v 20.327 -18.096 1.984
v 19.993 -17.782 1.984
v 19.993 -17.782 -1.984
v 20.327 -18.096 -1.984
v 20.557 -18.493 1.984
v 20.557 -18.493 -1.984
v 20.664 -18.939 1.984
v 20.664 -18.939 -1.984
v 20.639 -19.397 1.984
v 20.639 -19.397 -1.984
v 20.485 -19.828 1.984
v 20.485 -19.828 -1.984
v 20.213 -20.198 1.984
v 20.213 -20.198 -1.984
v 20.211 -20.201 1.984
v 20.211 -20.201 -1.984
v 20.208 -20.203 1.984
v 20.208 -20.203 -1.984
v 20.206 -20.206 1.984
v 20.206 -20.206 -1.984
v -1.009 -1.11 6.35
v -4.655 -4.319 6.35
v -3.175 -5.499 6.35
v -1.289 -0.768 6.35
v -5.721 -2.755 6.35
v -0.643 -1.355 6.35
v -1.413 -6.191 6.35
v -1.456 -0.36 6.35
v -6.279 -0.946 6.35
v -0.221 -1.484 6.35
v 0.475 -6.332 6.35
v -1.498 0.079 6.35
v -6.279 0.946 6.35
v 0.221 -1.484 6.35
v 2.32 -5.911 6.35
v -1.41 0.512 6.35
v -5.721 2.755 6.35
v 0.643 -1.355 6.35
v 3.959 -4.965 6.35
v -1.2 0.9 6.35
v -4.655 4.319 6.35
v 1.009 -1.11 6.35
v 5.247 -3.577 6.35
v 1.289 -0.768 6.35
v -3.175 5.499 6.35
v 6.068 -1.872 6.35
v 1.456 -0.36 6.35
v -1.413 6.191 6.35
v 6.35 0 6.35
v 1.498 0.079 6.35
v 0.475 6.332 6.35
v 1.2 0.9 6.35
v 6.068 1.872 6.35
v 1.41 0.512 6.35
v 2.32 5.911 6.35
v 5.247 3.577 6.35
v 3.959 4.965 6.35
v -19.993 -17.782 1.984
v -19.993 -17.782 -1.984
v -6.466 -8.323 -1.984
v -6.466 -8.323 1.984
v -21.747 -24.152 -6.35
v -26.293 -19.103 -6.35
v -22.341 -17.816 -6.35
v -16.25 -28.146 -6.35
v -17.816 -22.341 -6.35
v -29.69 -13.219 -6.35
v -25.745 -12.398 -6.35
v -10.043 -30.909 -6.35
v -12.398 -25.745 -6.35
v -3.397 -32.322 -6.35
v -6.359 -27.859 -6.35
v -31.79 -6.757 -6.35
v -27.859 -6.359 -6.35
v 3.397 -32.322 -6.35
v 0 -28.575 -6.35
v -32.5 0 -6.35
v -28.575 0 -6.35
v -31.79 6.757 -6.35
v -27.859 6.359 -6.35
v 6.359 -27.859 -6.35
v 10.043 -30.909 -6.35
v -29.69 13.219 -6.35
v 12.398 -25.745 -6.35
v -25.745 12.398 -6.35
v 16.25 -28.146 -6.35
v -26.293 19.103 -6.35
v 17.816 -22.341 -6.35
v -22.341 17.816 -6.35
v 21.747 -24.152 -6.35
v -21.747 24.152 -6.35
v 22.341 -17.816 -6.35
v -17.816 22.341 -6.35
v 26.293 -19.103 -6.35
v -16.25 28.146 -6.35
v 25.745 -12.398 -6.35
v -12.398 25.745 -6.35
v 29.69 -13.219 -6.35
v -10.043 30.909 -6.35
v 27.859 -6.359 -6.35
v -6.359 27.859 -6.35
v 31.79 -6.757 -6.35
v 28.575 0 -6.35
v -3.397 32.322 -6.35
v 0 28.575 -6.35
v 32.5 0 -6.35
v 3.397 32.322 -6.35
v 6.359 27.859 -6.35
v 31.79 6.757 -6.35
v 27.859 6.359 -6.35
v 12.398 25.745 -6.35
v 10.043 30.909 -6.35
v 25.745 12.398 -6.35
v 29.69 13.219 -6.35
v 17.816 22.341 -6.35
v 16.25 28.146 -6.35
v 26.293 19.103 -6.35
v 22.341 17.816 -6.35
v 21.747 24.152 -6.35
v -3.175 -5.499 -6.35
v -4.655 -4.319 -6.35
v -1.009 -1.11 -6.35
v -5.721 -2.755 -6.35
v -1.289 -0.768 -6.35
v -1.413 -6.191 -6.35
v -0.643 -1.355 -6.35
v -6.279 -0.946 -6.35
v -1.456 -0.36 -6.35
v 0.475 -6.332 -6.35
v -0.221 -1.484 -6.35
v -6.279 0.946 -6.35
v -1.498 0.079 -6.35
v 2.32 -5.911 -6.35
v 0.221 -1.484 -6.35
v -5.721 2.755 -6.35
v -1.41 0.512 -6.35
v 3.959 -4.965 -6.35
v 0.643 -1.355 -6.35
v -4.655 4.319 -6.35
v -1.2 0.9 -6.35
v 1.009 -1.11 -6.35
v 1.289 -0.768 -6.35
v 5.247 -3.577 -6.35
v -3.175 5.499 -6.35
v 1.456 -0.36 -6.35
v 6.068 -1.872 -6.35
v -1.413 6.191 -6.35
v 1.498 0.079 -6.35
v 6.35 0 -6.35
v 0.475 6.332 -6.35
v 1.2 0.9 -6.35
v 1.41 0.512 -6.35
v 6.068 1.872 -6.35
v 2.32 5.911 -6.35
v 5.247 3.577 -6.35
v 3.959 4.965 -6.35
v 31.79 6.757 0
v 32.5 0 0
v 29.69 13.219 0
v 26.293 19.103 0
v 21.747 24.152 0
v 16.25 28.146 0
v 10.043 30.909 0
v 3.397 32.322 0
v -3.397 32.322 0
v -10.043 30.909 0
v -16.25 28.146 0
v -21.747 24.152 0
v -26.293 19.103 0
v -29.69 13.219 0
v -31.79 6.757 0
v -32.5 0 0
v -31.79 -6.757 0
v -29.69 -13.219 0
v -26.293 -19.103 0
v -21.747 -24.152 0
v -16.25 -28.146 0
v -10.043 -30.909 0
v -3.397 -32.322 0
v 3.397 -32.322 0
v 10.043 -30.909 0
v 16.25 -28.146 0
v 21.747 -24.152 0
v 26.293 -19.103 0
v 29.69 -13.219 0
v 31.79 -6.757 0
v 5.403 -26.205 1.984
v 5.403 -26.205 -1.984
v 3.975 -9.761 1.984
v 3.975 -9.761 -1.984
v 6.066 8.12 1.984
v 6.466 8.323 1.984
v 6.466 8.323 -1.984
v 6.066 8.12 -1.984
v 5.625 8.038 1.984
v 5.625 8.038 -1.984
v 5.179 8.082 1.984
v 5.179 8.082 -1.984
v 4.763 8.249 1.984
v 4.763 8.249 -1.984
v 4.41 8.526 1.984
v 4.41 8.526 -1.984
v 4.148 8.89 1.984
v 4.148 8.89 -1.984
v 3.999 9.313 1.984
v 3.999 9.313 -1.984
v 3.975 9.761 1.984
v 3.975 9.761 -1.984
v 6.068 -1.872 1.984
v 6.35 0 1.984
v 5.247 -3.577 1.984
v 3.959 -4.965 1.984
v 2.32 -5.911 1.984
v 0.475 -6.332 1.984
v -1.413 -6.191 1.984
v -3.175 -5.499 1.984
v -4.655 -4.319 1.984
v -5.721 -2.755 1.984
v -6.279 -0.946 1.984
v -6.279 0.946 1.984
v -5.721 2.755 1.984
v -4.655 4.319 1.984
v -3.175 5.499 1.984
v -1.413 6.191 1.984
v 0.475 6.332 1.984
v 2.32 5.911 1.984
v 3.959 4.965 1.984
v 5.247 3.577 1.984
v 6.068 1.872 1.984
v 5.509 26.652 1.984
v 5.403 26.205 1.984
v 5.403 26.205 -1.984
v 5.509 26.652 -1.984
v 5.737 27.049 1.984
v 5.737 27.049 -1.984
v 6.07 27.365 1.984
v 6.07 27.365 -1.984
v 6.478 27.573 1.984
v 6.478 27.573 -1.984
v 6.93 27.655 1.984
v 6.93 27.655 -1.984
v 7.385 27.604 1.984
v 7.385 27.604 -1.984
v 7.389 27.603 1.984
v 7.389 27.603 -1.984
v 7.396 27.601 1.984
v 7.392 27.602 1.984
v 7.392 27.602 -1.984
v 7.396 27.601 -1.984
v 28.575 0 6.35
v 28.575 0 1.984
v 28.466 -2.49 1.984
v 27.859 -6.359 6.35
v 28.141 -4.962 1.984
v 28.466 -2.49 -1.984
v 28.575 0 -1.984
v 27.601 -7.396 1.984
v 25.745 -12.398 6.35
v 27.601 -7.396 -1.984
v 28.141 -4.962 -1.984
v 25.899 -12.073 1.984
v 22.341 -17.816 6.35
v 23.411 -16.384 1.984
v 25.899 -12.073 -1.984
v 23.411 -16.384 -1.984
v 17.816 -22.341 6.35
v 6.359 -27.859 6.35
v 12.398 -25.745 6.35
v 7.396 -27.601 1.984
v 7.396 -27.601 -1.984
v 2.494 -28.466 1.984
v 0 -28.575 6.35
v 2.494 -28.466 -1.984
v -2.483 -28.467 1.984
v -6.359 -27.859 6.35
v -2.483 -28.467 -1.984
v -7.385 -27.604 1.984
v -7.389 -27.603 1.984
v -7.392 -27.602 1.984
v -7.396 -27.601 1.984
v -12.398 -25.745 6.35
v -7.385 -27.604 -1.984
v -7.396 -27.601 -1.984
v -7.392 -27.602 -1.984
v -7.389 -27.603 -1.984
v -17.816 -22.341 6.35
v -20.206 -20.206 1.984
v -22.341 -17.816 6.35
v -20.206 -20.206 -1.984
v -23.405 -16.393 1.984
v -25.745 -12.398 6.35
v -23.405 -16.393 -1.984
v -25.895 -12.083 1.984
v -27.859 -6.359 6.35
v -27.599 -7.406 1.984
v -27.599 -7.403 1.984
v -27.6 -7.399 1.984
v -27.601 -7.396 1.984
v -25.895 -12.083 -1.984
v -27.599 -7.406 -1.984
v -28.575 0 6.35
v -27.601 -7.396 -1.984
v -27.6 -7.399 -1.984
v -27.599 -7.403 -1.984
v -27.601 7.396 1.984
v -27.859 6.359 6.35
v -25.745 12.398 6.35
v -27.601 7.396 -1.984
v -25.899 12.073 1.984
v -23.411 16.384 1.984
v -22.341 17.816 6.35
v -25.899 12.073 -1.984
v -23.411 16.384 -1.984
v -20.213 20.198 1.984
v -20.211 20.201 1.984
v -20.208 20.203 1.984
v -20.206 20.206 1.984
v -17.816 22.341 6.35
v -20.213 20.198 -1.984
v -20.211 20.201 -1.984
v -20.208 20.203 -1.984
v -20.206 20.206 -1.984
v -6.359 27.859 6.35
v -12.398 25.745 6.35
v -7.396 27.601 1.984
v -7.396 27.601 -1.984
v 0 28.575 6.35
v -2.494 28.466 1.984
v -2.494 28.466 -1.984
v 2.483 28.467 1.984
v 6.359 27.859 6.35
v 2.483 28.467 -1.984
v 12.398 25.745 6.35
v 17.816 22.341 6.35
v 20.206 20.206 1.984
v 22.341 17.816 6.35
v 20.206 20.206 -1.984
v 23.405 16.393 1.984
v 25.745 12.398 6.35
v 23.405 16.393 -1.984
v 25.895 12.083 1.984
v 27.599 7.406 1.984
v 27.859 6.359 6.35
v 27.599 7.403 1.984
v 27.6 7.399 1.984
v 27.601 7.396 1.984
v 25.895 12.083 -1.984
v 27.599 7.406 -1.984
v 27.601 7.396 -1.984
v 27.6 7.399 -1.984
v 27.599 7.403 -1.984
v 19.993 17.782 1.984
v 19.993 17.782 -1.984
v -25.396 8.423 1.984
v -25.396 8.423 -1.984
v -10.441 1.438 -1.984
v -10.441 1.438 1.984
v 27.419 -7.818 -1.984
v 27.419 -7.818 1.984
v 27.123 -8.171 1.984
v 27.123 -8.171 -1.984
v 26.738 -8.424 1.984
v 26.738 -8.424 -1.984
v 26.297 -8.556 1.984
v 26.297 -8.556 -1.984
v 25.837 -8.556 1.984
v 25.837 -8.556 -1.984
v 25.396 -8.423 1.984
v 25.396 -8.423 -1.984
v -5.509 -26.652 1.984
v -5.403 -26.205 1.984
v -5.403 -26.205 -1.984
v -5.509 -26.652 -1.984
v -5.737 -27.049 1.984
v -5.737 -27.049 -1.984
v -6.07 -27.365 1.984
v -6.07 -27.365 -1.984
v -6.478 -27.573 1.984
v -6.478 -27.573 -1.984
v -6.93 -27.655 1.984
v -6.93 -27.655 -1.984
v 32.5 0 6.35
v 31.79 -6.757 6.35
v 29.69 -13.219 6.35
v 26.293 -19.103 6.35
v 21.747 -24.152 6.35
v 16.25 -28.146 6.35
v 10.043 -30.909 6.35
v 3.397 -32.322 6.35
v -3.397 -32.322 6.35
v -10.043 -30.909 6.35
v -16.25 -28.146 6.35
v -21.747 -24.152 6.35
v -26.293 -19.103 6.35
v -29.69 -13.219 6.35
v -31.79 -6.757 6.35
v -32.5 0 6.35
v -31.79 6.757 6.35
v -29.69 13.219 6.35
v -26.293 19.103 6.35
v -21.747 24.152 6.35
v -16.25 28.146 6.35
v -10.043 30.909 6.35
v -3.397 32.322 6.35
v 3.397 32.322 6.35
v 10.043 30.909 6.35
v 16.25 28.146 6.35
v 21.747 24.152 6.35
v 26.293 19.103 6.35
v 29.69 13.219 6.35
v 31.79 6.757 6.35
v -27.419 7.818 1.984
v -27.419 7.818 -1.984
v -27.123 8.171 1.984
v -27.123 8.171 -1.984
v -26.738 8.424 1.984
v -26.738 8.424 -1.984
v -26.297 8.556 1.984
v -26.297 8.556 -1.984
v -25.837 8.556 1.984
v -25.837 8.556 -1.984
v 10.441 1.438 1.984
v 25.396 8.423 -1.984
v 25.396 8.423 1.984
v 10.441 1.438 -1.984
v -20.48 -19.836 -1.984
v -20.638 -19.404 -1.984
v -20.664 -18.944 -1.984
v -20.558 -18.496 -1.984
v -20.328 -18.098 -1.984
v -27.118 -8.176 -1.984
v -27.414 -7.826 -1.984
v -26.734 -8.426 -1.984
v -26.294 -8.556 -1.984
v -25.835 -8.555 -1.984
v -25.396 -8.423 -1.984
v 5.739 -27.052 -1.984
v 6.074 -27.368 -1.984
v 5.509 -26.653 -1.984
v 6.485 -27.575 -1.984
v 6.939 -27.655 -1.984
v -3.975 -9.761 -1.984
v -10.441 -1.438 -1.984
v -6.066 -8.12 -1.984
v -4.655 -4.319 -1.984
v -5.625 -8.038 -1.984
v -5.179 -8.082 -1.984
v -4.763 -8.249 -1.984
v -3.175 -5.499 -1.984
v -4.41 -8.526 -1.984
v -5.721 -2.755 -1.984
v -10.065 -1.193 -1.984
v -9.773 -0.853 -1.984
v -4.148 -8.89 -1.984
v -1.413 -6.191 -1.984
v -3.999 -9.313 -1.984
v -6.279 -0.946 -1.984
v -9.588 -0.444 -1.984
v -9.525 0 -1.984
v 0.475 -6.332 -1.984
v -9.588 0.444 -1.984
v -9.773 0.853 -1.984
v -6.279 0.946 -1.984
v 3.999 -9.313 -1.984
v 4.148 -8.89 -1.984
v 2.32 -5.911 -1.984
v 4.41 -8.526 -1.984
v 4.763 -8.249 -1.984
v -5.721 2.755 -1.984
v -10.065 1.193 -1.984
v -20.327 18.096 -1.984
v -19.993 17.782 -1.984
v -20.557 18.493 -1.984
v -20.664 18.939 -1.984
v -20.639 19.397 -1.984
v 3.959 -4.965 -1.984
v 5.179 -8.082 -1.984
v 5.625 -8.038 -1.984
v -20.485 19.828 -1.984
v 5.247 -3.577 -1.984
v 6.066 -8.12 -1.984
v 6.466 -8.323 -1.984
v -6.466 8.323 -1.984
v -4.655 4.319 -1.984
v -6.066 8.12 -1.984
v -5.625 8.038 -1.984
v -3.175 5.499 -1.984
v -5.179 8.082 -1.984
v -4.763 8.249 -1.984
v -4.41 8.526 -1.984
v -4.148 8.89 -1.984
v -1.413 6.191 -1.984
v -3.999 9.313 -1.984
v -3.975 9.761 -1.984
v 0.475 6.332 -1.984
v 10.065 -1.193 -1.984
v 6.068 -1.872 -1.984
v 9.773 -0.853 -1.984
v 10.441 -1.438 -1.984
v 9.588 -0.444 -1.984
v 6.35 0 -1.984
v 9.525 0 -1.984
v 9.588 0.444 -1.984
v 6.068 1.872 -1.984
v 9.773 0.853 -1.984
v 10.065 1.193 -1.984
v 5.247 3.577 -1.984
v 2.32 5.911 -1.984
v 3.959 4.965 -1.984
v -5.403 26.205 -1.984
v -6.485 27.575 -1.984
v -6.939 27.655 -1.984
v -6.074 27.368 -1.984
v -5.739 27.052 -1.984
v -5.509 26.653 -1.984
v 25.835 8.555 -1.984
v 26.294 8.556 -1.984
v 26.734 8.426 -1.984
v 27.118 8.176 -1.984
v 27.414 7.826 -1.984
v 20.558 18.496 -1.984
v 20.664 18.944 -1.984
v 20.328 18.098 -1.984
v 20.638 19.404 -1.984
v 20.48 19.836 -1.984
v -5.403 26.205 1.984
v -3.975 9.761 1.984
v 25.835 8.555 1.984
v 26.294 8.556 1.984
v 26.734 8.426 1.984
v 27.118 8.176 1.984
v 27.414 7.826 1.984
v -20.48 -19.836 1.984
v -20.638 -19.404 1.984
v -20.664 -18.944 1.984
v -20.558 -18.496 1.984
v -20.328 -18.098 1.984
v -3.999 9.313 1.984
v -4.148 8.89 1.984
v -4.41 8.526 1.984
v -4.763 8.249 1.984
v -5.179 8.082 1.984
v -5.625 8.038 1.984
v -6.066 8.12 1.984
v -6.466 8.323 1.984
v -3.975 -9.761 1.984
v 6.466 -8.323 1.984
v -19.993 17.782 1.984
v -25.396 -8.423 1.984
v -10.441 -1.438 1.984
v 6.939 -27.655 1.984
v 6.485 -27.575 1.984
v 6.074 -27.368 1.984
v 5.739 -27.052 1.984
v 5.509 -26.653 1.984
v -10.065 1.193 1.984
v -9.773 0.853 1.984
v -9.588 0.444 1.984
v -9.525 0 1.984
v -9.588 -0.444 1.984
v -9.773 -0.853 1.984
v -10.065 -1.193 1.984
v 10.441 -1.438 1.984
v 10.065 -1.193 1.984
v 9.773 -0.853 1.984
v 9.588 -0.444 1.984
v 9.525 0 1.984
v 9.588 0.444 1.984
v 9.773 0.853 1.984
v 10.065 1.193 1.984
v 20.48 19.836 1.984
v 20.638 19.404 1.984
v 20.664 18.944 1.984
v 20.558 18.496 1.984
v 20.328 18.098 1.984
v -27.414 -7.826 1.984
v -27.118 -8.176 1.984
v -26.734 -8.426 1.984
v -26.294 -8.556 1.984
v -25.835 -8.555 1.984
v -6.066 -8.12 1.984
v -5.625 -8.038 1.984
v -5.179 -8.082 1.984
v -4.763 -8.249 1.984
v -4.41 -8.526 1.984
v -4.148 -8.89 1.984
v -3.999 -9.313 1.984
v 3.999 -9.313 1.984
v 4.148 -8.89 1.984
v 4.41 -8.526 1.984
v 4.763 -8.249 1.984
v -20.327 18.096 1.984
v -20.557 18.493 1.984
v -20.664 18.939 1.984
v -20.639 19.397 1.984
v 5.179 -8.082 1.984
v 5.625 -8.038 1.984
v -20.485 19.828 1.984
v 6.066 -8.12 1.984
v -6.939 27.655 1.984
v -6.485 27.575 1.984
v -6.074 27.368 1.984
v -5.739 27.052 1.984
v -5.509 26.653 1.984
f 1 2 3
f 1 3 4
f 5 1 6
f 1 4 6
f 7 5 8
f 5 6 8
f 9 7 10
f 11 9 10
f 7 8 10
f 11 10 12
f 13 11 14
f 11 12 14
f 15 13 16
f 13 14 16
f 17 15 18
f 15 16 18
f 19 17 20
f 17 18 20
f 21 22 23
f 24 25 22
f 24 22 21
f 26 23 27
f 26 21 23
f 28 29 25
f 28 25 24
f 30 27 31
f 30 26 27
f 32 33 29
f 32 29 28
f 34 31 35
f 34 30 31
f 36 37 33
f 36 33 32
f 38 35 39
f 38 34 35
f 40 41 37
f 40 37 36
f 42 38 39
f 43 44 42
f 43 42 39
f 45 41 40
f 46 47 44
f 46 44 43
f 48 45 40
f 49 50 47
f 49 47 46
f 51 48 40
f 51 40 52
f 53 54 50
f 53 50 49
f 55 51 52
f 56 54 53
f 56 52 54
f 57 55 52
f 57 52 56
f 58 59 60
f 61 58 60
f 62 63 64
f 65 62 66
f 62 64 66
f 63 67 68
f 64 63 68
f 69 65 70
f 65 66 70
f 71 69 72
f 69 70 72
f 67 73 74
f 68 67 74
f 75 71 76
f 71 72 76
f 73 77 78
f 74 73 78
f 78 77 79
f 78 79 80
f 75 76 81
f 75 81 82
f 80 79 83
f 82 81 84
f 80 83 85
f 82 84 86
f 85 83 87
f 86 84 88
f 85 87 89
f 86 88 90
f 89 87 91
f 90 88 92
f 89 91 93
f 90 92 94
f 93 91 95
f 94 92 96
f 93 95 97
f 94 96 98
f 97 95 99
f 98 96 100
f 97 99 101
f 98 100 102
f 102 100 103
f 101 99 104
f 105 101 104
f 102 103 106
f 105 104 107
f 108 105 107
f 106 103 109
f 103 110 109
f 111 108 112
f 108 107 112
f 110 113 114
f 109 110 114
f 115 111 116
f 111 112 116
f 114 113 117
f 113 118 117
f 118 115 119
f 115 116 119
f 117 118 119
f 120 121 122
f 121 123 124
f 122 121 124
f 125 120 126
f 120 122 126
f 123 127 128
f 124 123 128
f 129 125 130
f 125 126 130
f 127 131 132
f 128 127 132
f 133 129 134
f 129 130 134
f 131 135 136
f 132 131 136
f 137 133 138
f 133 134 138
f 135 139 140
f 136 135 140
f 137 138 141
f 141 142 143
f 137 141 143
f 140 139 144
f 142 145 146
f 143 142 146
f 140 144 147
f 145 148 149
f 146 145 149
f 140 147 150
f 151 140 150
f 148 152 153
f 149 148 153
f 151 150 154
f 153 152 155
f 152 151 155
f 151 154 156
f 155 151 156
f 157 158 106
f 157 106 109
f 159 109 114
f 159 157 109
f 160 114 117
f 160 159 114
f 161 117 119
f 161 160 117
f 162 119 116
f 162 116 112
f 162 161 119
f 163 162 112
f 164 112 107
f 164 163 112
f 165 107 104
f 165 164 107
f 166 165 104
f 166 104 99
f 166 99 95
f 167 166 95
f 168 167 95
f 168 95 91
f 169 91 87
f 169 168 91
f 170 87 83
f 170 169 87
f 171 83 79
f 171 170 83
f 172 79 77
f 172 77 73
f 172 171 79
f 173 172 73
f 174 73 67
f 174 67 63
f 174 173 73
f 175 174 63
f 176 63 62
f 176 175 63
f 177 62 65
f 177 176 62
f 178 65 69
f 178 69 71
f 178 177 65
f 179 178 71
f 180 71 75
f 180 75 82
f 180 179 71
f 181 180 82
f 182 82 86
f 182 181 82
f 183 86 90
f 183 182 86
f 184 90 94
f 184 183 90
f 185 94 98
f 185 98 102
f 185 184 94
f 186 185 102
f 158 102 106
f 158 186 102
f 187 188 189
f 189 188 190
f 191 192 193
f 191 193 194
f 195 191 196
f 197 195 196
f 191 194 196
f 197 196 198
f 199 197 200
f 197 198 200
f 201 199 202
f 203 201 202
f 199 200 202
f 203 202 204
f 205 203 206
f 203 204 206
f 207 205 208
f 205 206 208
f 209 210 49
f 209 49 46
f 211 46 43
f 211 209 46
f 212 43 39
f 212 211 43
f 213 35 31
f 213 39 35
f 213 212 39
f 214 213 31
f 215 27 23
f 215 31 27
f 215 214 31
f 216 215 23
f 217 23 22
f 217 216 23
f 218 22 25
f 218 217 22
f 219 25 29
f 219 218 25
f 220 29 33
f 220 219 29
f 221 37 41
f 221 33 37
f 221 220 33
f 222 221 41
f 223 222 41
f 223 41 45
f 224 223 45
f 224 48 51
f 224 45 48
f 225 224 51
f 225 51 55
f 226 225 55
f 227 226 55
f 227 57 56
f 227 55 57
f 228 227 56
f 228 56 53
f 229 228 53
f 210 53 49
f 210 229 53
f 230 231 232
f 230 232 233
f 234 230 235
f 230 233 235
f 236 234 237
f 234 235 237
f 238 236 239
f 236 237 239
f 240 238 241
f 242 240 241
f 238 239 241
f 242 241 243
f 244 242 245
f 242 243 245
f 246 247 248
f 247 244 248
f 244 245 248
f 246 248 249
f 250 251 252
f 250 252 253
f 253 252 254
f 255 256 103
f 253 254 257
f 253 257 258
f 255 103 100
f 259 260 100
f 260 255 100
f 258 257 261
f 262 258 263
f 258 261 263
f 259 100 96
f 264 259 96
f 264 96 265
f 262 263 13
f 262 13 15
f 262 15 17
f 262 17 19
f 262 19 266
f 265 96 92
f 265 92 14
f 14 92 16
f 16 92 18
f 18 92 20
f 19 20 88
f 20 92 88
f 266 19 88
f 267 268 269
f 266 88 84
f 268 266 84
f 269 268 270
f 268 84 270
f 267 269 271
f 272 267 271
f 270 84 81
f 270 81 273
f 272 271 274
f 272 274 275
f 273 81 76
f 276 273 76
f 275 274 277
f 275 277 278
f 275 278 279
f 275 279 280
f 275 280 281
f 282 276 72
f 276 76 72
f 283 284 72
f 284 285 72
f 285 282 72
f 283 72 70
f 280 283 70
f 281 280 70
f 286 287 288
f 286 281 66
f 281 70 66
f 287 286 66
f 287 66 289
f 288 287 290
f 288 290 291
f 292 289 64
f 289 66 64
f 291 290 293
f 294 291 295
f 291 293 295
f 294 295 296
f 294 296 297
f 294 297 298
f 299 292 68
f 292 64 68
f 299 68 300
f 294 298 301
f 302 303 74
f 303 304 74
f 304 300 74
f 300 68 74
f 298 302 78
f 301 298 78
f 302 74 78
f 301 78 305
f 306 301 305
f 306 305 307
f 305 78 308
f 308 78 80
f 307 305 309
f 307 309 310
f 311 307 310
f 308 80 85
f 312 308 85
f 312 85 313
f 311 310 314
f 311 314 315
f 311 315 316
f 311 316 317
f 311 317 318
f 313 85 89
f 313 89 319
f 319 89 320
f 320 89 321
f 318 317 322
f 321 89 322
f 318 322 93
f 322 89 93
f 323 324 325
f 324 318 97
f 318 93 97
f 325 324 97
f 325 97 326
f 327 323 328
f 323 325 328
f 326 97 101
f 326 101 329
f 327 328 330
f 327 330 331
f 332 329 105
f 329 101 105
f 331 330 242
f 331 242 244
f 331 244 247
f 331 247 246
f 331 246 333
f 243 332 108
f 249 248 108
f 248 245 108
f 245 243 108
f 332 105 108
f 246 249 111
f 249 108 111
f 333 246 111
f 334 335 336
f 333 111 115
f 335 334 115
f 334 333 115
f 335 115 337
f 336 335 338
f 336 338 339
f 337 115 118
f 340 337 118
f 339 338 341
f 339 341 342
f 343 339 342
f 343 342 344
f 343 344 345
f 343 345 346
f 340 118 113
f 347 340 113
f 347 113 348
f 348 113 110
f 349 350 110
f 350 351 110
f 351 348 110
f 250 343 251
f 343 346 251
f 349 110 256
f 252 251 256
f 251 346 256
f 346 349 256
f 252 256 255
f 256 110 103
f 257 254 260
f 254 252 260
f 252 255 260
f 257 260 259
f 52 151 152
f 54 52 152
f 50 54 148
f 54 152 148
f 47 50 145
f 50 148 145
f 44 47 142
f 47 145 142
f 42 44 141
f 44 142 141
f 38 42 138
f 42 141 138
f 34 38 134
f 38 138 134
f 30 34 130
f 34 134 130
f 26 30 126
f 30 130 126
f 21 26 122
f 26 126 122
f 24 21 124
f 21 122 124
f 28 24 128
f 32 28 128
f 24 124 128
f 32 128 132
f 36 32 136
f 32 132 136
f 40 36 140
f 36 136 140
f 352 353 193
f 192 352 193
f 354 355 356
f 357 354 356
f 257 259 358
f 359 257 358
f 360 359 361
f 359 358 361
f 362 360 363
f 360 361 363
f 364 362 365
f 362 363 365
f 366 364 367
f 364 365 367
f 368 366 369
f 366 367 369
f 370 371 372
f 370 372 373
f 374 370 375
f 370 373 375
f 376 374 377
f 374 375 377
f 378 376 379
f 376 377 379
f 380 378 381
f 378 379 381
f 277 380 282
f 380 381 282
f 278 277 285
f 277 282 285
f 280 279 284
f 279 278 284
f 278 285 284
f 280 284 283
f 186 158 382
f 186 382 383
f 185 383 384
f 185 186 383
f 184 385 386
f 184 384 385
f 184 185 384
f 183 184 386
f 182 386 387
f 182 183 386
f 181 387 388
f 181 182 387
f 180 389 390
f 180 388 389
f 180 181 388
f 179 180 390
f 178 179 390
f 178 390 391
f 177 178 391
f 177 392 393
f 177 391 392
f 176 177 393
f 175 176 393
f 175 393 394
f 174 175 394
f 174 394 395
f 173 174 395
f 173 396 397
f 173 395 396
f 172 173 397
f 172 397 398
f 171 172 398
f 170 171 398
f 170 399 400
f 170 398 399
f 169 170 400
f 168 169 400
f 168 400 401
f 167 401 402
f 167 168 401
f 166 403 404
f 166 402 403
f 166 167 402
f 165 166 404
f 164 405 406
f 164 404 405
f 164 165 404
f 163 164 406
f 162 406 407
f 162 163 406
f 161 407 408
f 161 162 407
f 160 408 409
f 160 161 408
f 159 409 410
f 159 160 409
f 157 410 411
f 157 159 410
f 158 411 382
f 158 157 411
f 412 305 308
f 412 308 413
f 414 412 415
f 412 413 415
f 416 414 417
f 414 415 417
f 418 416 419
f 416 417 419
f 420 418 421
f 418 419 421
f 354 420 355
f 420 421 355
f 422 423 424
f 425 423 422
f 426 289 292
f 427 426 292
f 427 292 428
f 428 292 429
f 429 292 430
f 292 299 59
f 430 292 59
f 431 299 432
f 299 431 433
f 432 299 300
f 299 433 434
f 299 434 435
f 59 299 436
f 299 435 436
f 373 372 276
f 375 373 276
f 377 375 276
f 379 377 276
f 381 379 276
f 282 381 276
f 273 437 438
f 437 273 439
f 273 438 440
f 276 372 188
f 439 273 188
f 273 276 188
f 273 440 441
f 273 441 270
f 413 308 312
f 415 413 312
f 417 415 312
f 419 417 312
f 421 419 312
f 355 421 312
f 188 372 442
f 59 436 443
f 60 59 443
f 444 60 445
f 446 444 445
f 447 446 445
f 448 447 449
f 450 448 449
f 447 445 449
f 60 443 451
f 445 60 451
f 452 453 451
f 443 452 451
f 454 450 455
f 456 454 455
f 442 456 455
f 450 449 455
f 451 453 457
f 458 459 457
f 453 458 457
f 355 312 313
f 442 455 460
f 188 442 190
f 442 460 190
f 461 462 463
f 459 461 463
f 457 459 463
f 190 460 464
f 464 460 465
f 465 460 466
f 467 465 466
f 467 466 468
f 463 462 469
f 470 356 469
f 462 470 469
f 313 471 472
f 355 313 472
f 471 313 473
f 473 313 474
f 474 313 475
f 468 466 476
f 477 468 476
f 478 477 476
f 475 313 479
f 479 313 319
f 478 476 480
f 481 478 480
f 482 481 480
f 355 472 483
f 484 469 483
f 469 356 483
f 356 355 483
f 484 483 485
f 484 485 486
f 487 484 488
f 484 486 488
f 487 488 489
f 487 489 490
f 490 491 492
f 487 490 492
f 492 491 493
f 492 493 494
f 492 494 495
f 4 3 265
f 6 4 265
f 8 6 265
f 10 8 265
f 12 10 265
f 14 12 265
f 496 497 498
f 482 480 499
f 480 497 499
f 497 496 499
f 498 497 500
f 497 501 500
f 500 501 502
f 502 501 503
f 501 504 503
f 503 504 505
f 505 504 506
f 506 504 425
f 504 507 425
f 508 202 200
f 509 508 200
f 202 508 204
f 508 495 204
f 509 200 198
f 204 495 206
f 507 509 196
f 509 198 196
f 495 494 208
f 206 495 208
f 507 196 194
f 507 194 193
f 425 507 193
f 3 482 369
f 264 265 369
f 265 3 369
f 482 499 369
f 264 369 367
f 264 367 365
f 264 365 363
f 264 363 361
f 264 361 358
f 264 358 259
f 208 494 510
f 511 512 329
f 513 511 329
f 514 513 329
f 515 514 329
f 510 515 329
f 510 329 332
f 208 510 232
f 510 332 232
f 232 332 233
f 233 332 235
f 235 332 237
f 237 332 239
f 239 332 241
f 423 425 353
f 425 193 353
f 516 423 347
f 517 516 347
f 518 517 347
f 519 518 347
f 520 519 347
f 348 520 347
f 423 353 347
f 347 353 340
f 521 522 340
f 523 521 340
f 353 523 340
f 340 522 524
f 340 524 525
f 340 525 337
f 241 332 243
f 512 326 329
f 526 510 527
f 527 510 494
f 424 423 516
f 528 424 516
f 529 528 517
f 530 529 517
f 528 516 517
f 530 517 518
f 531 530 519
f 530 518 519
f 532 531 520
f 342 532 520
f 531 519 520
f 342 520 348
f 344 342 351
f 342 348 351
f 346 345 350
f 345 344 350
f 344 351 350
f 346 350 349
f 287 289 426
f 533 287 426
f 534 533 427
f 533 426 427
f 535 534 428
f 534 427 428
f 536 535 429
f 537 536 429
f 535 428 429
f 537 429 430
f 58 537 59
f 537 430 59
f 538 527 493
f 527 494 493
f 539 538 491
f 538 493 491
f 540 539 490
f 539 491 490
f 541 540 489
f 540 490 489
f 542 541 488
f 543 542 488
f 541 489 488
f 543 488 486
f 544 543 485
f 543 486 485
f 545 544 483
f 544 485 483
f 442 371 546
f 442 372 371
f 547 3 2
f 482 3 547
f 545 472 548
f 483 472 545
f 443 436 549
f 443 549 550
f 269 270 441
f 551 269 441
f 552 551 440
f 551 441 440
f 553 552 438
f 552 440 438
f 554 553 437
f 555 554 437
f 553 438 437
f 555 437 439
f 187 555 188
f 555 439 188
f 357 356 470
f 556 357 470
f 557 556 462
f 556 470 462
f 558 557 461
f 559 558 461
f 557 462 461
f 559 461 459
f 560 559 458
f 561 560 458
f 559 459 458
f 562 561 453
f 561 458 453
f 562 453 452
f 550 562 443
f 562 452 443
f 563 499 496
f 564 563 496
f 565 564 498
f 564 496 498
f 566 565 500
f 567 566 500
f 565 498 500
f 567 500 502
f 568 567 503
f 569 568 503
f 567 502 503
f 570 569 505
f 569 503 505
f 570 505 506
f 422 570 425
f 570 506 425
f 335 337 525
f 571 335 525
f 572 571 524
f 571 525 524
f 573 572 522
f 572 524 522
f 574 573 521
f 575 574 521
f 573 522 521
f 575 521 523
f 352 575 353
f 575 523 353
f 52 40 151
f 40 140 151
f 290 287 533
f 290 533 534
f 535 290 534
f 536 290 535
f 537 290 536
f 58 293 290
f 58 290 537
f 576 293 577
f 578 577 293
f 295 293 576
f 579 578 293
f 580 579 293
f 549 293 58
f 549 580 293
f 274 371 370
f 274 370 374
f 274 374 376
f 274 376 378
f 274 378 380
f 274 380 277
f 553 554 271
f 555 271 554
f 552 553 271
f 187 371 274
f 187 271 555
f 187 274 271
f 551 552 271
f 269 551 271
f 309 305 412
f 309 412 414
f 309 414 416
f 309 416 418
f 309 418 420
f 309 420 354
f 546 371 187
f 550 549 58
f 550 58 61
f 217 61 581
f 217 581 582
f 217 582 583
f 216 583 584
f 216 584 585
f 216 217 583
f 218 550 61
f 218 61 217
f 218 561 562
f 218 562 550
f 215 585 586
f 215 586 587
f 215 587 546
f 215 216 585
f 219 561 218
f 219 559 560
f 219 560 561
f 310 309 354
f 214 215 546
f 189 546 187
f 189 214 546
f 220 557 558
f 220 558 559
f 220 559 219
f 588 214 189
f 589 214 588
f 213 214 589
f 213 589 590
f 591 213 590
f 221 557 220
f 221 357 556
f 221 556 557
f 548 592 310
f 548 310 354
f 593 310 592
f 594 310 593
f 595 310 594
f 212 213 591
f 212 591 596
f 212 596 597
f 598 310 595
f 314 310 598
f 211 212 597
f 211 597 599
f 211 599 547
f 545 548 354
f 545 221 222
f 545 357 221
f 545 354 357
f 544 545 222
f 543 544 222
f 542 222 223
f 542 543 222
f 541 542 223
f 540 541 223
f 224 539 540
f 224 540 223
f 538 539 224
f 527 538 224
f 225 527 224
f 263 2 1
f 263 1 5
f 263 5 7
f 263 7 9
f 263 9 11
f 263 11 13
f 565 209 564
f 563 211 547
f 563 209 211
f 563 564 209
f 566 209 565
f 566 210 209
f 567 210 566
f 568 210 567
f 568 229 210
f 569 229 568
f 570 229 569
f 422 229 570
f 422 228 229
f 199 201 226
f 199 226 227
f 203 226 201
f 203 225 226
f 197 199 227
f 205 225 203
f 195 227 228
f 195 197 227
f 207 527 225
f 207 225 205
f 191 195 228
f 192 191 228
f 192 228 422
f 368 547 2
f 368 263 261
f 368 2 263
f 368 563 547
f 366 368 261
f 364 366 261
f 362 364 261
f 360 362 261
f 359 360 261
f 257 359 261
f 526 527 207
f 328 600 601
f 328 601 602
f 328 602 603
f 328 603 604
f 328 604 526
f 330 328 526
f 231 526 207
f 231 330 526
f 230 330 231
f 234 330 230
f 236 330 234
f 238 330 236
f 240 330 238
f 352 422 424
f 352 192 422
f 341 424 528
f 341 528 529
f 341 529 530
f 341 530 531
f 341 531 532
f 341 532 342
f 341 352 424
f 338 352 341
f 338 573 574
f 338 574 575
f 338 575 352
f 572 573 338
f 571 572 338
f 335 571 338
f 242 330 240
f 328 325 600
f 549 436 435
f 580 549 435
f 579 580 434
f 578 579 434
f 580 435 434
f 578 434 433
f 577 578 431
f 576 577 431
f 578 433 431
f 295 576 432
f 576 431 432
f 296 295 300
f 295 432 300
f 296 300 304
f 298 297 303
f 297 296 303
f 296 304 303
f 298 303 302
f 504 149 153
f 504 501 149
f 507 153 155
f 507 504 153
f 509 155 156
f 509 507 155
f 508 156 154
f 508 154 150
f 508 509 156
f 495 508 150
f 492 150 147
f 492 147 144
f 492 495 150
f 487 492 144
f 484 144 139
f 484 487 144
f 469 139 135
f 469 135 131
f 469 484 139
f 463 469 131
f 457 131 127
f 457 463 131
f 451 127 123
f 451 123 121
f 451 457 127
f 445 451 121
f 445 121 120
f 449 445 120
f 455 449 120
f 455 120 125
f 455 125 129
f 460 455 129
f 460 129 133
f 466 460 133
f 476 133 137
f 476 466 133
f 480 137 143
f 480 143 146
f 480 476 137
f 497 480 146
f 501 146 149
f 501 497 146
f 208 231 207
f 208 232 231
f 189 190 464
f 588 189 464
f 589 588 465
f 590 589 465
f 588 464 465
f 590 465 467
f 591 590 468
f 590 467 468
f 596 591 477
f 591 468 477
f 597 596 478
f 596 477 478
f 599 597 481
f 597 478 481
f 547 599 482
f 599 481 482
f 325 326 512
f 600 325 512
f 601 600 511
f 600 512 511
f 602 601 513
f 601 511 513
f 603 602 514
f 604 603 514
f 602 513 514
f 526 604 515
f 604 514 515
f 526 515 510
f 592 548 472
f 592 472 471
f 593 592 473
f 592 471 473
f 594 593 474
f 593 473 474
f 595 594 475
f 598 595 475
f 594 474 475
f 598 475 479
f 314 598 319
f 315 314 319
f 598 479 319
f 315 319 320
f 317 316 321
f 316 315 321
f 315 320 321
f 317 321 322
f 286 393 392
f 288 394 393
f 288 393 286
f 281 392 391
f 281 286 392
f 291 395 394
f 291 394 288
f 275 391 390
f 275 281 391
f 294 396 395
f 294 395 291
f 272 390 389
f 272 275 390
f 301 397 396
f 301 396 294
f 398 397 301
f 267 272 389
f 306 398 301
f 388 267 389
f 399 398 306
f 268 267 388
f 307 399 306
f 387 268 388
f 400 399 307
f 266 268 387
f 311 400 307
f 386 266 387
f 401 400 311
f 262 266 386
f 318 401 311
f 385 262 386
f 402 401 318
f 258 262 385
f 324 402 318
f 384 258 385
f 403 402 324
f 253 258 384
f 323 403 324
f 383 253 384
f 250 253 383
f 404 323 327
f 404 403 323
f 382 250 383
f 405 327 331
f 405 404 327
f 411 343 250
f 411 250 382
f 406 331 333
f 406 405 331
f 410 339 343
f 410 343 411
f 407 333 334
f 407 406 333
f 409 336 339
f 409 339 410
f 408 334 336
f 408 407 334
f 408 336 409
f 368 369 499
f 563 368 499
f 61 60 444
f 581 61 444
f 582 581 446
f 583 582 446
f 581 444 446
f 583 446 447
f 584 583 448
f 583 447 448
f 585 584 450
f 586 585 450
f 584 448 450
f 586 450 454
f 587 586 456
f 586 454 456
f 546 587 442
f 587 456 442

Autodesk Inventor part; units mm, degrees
ref_plane "YZ Plane (RIGHT)" through (0, 0, 0) normal (1, 0, 0) x (0, 1, 0)
ref_plane "XY Plane (FRONT)" through (0, 0, 0) normal (0, 0, 1) x (1, 0, 0)
sketch "Sketch2" plane through (0, 0, 0) normal (0, 0, 1) x (1, 0, 0)
  circle A0 centre (0, 0) radius 6.35
  circle A1 centre (0, 0) radius 1.5
  line L0 (0, 0.9) -> (-1.2, 0.9)
  line L1 (-1.2, 0.9) -> (1.2, 0.9)
  arc A2 (1.2, 0.9) -> (-1.2, 0.9) centre (0, 0) ccw
  dimension "d1" = 12.7
  dimension "d37" = 3
  dimension "d38" = 0.9
extrude "Extrusion1" add sketch "Sketch2" along normal mid plane 12.7 contours A0 | L1 L0 A1 picked at (-0.7204, 0.9839)
sketch "Sketch3" plane through (0, 0, 0) normal (0, 0, 1) x (1, 0, 0)
  circle A0 centre (0, 0) radius 28.575
  circle A1 centre (0, 0) radius 3.175 projected
  circle A2 centre (0, 0) radius 6.35
  circle A3 centre (0, 0) radius 6.35 projected
  dimension "d4" = 57.15
extrude "Extrusion2" add sketch "Sketch3" along normal mid plane 3.9688 contours A0
sketch "Sketch4" plane through (0, 0, 0) normal (0, 0, 1) x (1, 0, 0)
  circle A0 centre (0, 0) radius 3.175 projected
  circle A1 centre (0, 0) radius 32.5
  circle A2 centre (0, 0) radius 28.575
  circle A3 centre (0, 0) radius 28.575 projected
  dimension "d7" = 65
extrude "Extrusion3" add sketch "Sketch4" along normal mid plane 12.7 contours A1
sketch "Sketch7" plane through (0, 0, 1.9844) normal (0, 0, 1) x (1, 0, 0)
  circle A0 centre (0, 0) radius 3.175 construction
  line L0 (0, 0) -> (-6.9849, 26.0679) construction
  arc A1 (-5.4033, 26.2053) -> (-7.3958, 27.6013) centre (-6.9849, 26.0679) ccw
  circle A2 centre (0, 0) radius 28.575 projected
  line L1 (0, 0) -> (0, 17.8508) construction
  arc A3 (-6.8709, 8.7338) -> (-3.9747, 9.7611) centre (-5.5563, 9.6237) ccw
  line L2 (0, 0) -> (-5.5563, 9.6237) construction
  circle A4 centre (0, 0) radius 11.1125 construction
  arc A5 (-20.2056, 20.2056) -> (-19.9928, 17.7821) centre (-19.083, 19.083) ccw
  line L3 (-19.083, 19.083) -> (0, 0) construction
  line L4 (-19.9928, 17.7821) -> (-6.466, 8.3228)
  line L5 (-5.4033, 26.2053) -> (-3.9747, 9.7611)
  arc A6 (-7.3958, 27.6013) -> (-20.2056, 20.2056) centre (0, 0) ccw
  dimension "d17" = 3.175
  dimension "d18" = 15
  dimension "d19" = 30
  dimension "d20" = 22.225
  dimension "d21" = 30
extrude "Extrusion4" cut sketch "Sketch7" along normal through all both and the other way through all contours L5 A3 L4 A5 A2 A1 picked at (-7.1514, 20.6214)
pattern_circular "Circular Pattern1" count 6 over 360 about axis through (0, 0, 0) along (0, 0, 1) of "Extrusion4"
ref_plane "Work Plane1" through (0, 6.35, 0) normal (0, 1, 0) x (-1, 0, 0)
sketch "Sketch8" plane through (0, 6.35, 0) normal (0, 1, 0) x (-1, 0, 0)
  line L0 (-16.7863, 6.35) -> (14.809, 6.35) construction
  point P0 (0, 0)
  dimension "d27" = 6.35
ref_plane "Work Plane2" through (16.7863, 6.35, 6.35) normal (0, -0.9397, 0.342) x (1, 0, 0)
properties part number "flywheel" material "LCP Plastic"
